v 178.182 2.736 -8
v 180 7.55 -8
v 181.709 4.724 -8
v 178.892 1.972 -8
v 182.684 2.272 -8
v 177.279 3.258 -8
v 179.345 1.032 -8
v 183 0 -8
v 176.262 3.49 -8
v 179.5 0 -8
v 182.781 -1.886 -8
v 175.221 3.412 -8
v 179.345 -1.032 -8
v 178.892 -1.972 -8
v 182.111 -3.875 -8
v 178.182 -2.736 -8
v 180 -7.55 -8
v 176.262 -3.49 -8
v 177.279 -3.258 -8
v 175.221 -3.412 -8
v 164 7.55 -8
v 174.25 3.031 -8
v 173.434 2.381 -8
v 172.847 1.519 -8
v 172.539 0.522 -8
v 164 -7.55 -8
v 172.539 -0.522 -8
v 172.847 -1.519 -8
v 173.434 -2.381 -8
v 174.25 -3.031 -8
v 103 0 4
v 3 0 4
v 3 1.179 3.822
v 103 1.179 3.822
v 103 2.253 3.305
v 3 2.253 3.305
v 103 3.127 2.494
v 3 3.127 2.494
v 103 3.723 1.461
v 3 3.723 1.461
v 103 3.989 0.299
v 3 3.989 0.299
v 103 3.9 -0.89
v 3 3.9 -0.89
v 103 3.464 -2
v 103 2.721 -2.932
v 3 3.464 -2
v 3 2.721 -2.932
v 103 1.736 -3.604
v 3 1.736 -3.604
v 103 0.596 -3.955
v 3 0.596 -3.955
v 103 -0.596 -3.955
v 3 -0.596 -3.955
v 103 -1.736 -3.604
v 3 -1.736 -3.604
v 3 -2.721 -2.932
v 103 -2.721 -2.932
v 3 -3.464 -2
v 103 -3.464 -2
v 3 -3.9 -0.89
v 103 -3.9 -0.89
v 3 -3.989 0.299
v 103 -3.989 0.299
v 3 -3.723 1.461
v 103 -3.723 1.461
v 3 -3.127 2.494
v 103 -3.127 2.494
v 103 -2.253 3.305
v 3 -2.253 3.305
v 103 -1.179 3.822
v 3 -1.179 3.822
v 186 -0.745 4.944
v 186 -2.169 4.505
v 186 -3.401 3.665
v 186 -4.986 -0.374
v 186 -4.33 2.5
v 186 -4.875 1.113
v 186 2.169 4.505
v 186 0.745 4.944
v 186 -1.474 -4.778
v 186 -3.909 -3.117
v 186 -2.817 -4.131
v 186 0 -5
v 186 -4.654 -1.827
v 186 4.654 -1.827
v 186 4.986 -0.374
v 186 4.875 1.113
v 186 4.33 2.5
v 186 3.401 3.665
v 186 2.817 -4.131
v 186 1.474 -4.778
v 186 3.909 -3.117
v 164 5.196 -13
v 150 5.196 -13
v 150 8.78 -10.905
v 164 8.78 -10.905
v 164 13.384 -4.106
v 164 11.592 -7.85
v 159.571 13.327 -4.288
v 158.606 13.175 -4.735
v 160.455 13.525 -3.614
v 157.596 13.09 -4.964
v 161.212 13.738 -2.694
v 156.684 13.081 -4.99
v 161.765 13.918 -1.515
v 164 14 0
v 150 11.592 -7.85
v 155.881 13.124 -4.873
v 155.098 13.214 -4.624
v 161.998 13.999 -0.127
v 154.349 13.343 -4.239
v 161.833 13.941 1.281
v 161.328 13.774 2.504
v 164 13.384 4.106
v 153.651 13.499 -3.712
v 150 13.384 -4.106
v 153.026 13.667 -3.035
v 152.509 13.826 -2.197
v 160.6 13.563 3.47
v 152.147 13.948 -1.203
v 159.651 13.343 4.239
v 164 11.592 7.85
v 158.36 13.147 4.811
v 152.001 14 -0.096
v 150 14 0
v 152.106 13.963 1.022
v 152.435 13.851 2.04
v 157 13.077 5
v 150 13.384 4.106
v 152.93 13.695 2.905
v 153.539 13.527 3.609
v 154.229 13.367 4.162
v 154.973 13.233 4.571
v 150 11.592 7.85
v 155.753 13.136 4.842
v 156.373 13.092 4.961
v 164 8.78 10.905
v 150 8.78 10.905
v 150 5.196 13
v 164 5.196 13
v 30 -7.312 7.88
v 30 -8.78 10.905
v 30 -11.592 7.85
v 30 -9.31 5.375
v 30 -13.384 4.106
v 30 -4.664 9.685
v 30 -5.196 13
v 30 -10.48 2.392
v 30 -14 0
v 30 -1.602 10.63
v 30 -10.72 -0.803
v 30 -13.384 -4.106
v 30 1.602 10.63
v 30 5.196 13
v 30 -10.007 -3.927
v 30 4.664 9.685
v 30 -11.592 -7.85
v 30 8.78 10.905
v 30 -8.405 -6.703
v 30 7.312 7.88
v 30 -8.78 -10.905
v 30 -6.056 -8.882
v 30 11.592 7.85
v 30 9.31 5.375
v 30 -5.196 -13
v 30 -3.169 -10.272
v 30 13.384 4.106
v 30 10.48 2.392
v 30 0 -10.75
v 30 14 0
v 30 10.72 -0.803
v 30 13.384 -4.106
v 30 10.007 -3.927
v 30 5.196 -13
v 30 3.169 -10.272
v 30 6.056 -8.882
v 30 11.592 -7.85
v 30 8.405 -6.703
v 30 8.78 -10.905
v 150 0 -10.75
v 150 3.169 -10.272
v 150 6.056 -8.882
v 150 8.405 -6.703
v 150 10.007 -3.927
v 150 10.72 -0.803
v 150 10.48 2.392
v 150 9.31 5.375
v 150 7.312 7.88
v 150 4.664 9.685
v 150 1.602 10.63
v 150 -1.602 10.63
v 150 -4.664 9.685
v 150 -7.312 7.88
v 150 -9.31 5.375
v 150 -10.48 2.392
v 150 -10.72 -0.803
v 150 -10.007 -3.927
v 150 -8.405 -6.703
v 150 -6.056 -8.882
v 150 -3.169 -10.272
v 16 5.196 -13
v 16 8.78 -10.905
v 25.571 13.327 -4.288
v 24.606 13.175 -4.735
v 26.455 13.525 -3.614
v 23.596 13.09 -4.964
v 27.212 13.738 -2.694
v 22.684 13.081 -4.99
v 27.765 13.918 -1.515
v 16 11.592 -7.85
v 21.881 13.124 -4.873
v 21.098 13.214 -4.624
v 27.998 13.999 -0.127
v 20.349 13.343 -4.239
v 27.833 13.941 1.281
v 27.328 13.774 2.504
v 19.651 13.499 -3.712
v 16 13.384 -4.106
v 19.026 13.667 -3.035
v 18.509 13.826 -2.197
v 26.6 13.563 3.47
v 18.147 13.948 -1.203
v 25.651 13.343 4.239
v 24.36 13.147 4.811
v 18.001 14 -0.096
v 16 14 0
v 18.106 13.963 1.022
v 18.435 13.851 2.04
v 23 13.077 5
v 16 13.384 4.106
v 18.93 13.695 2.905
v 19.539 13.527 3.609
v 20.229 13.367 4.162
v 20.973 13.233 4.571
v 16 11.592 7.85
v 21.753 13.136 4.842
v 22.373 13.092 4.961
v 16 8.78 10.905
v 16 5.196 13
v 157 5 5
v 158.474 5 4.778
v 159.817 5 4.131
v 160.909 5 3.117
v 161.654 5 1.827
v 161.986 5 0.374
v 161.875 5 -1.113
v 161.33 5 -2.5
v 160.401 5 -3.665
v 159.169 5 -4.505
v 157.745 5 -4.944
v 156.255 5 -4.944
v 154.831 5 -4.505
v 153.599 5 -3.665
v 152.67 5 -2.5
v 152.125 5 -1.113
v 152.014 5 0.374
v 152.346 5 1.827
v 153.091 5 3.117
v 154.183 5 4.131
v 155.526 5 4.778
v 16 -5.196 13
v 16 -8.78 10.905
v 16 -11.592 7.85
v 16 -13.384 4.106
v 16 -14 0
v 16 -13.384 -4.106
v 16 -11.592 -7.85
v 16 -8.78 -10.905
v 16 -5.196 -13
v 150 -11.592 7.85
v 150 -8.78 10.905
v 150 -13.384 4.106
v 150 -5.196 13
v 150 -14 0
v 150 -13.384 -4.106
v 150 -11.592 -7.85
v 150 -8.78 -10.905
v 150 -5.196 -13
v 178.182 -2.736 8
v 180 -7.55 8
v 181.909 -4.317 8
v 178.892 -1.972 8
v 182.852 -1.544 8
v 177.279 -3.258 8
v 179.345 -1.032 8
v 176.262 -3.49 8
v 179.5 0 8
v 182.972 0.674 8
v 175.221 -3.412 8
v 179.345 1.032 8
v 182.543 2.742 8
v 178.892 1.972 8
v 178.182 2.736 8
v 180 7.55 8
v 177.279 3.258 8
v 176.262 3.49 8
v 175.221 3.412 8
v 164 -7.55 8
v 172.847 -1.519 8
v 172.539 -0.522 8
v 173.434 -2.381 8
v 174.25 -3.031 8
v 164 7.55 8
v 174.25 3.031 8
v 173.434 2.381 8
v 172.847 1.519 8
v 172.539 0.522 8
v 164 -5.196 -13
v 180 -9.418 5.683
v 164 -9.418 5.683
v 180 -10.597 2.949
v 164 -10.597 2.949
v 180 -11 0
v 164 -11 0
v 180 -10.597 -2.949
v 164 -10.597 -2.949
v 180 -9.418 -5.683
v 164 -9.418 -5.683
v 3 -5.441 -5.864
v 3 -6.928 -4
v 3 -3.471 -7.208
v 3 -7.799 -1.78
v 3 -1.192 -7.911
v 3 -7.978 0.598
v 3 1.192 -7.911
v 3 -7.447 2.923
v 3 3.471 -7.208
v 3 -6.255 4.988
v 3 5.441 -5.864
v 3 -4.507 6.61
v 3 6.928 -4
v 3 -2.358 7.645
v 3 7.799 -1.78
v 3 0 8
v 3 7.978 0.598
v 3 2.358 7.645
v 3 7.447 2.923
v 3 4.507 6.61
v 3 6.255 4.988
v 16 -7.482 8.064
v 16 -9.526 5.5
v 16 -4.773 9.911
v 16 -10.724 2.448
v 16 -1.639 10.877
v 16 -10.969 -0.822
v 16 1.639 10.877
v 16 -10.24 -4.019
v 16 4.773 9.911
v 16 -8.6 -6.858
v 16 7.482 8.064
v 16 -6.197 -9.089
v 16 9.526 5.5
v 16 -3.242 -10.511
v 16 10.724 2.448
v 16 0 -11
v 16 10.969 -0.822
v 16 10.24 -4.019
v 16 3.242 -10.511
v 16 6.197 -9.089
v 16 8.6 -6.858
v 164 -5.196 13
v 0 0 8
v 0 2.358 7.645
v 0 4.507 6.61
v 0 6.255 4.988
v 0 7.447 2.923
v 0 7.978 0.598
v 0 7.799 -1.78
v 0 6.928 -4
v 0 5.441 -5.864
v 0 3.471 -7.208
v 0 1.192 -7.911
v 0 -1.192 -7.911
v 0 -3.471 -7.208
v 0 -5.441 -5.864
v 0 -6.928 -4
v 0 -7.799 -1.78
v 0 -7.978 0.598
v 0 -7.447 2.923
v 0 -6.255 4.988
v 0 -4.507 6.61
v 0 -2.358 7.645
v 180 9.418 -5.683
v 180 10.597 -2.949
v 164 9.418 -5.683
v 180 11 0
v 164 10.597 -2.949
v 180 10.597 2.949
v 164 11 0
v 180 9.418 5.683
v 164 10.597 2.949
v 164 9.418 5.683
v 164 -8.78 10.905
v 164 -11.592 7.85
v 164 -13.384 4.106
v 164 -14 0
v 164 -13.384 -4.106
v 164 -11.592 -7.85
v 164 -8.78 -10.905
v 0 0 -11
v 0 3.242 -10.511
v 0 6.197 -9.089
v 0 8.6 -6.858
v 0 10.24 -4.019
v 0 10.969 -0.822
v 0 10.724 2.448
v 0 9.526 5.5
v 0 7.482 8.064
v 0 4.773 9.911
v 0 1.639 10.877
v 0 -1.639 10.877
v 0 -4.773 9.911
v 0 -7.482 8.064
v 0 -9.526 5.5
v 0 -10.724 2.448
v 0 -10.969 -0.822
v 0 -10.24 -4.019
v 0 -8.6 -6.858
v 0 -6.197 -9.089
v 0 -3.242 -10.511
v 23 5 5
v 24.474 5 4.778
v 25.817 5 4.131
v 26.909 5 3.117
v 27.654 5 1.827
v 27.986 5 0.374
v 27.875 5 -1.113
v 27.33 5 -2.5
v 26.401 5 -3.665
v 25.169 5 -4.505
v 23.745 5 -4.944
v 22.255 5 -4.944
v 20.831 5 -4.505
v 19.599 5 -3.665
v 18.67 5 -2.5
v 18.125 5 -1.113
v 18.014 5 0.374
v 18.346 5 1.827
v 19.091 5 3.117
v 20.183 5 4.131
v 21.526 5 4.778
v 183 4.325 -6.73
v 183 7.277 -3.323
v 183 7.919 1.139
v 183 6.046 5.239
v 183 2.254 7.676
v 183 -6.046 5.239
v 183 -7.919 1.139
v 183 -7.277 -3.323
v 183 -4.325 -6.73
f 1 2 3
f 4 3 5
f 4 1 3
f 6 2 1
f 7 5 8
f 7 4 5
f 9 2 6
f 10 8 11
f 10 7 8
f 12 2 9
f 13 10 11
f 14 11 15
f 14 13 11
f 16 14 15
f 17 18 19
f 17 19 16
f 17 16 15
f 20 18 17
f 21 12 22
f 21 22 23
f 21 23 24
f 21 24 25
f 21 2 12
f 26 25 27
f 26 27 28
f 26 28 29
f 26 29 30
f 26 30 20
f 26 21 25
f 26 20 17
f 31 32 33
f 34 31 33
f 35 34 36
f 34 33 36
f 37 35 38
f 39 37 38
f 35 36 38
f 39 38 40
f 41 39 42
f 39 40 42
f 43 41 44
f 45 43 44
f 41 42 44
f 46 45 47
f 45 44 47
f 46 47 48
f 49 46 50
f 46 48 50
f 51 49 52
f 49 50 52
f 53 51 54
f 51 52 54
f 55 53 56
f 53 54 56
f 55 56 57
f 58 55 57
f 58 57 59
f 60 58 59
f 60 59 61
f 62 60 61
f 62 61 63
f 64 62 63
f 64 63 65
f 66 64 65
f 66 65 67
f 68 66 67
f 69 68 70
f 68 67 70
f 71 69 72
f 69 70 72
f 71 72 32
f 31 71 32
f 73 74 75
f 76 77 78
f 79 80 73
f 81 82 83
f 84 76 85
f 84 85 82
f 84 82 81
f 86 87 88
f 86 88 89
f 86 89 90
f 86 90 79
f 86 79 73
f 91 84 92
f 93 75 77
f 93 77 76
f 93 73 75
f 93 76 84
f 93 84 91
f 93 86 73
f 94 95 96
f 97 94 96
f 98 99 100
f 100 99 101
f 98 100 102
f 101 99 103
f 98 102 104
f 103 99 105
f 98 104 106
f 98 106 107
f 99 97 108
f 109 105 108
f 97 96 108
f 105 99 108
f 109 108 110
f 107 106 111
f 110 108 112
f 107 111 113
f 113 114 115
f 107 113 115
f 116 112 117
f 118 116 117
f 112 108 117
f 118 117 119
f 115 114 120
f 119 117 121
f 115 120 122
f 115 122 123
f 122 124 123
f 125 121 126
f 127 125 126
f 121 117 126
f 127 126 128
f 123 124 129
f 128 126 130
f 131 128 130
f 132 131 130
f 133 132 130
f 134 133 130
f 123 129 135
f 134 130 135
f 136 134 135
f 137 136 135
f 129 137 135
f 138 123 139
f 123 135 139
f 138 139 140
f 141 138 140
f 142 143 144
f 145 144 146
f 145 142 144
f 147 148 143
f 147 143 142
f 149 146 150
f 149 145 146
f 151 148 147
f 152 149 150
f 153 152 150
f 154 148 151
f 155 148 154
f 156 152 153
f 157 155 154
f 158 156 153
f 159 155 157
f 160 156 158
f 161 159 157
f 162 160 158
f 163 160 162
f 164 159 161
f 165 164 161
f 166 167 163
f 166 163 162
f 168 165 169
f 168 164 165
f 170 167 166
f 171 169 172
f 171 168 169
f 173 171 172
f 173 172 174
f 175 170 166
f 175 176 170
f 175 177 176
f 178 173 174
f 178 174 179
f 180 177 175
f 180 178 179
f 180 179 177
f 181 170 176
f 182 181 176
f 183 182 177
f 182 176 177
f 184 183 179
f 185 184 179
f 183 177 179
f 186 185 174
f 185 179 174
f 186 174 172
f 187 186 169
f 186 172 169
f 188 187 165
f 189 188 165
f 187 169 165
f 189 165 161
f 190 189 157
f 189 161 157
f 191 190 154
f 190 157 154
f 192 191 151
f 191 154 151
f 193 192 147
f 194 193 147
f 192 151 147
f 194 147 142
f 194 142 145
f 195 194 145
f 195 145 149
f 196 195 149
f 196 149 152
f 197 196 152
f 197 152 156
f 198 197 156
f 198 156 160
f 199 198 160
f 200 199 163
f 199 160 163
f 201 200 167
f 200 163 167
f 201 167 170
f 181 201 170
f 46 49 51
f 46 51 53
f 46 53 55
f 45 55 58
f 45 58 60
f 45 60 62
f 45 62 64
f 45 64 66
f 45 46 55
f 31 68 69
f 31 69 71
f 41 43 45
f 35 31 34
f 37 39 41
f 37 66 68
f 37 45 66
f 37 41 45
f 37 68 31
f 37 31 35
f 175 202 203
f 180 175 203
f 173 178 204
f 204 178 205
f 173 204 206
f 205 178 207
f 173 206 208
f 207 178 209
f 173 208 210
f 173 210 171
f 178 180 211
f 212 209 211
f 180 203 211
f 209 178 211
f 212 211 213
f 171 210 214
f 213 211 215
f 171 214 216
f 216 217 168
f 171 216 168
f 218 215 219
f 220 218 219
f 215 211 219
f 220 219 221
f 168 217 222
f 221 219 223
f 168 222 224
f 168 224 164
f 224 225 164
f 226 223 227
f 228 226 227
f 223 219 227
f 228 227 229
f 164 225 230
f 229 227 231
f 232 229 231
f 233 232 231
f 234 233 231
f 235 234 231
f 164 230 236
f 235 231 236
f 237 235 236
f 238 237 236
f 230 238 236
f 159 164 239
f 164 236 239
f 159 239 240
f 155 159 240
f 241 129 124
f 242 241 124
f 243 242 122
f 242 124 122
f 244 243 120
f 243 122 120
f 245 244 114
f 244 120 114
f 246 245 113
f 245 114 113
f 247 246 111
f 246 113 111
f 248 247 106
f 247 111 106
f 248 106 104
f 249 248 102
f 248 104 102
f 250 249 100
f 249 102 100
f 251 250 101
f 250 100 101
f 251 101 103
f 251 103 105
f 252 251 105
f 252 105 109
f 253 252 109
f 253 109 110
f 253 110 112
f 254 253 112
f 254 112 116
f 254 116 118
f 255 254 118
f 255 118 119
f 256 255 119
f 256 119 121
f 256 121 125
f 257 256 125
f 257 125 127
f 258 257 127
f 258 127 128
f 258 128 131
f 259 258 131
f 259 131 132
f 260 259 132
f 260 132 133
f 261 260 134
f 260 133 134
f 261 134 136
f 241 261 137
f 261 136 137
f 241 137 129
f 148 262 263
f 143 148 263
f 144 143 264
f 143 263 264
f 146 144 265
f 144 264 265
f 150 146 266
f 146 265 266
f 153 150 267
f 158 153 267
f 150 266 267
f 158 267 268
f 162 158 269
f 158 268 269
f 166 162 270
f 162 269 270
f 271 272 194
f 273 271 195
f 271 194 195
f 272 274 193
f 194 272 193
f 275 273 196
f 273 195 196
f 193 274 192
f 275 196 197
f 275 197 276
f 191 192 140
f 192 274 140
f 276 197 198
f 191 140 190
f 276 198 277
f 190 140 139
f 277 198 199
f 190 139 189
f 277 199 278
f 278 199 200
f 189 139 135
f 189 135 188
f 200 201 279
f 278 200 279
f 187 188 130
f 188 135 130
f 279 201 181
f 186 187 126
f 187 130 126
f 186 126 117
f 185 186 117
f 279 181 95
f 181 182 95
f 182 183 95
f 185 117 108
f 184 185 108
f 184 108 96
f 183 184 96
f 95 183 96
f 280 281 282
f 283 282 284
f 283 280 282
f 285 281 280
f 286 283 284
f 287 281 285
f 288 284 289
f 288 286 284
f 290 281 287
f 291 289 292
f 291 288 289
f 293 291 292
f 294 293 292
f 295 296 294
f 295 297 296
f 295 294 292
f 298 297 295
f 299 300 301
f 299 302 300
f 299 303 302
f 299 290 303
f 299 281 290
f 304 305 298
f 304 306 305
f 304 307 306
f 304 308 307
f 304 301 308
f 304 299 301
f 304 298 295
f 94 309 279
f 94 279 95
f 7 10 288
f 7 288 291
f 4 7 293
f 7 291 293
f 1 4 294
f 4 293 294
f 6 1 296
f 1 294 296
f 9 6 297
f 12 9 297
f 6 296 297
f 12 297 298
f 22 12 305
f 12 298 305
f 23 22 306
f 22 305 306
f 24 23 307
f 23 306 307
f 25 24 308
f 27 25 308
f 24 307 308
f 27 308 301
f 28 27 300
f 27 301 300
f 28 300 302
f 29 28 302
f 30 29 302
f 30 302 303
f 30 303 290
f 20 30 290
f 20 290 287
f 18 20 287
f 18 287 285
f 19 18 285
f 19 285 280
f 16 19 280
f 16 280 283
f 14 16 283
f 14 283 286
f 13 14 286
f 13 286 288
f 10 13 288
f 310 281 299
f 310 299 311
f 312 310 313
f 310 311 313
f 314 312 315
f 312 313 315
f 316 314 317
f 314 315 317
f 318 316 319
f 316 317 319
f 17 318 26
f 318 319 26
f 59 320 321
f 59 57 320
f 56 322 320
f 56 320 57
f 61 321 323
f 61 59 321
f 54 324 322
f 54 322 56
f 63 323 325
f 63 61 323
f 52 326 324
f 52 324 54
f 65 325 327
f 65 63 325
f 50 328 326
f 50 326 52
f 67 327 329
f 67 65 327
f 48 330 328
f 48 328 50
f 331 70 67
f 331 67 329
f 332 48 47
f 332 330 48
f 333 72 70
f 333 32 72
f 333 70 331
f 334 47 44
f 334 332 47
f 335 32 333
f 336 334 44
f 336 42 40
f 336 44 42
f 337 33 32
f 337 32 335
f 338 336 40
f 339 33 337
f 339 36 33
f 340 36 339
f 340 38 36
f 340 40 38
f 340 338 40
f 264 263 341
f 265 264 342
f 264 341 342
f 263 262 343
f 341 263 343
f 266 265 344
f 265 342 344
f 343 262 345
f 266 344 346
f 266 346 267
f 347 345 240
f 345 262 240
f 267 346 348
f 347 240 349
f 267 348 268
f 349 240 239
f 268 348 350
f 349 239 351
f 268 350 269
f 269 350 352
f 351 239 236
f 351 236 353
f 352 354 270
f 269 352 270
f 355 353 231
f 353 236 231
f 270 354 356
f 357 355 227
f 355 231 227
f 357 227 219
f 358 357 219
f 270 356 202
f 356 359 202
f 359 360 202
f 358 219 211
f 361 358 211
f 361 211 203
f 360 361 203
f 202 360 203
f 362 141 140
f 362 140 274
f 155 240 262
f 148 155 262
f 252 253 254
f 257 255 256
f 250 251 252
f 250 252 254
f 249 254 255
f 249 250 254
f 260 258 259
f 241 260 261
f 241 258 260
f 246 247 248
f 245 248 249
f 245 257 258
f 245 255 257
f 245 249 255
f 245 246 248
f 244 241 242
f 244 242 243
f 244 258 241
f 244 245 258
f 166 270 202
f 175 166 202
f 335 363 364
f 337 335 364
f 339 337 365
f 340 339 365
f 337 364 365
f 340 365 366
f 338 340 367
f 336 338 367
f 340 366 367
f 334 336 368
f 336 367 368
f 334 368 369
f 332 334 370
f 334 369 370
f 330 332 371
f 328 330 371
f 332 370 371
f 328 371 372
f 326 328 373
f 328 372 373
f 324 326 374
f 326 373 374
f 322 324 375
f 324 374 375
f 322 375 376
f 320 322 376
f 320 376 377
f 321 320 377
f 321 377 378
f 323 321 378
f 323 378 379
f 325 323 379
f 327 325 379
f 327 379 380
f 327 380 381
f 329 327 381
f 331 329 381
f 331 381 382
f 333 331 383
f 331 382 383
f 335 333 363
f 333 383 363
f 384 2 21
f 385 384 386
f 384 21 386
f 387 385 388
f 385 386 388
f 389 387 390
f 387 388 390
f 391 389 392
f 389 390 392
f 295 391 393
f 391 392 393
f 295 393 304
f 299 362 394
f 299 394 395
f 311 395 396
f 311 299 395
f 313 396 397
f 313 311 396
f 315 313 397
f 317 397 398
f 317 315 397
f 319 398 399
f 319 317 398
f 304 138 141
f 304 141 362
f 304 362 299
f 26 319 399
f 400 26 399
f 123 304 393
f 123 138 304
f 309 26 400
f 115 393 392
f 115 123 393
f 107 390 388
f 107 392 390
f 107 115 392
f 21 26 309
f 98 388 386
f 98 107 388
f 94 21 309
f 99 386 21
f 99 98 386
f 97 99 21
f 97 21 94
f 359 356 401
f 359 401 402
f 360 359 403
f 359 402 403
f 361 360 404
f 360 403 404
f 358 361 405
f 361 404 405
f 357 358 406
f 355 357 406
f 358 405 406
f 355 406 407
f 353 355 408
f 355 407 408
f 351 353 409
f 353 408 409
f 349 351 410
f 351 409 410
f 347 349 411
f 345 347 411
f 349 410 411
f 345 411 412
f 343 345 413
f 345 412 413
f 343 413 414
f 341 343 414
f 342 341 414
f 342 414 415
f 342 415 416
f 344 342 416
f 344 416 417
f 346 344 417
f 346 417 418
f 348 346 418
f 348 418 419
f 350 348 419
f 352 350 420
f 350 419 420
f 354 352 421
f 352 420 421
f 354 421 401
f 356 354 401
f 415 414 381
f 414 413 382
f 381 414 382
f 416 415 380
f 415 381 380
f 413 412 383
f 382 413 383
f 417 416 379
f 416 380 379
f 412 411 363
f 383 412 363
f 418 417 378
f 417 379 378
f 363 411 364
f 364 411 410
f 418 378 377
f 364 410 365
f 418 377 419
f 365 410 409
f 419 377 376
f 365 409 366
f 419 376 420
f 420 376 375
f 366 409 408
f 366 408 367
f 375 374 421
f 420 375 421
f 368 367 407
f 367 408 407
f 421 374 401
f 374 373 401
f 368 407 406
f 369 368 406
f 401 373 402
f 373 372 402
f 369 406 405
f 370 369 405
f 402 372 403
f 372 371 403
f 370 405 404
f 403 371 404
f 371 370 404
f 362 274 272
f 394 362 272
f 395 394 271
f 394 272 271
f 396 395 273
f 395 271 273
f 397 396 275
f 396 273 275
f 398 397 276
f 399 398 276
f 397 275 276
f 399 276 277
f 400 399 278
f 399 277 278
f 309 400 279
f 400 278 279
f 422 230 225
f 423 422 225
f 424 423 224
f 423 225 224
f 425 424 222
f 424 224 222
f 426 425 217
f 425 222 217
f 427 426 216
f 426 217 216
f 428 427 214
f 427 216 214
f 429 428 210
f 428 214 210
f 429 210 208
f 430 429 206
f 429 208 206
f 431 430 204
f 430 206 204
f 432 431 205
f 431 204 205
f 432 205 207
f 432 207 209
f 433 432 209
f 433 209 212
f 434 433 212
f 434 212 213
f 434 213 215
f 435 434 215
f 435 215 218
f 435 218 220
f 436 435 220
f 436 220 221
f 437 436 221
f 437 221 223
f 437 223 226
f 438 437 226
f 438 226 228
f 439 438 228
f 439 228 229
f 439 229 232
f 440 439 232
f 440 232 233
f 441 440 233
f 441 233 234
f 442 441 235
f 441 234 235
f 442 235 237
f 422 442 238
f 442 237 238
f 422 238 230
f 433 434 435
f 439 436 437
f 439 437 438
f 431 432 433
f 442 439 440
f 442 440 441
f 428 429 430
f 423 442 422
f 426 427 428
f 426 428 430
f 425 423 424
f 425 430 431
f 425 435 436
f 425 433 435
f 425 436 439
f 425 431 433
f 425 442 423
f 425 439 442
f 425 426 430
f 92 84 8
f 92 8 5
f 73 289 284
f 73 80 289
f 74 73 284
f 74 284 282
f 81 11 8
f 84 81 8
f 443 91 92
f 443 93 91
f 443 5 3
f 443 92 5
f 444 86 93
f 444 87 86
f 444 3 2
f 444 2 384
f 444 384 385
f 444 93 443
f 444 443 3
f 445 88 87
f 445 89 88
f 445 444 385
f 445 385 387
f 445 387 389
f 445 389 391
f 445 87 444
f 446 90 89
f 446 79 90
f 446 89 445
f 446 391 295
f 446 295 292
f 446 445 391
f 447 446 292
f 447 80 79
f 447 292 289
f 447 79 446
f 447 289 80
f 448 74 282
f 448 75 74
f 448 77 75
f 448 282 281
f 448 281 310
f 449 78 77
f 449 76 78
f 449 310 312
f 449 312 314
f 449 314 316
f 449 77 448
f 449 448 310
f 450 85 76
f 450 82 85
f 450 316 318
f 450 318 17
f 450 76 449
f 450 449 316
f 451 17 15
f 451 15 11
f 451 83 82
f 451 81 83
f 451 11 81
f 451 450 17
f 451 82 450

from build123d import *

# Parameters (mm, degrees)
SKETCH_2_R          = 11
EXTRUDE_1_DEPTH     = 16
EXTRUDE_2_DEPTH     = 14
SKETCH_5_R          = 10.75
EXTRUDE_3_DEPTH     = 120
EXTRUDE_4_DEPTH     = 14
SKETCH_7_R          = 8
CUT_EXTRUDE_1_DEPTH = 3
SKETCH_8_R          = 4
CUT_EXTRUDE_2_DEPTH = 100
SKETCH_9_R          = 5
CUT_EXTRUDE_3_DEPTH = 15
SKETCH_10_R         = 11
EXTRUDE_5_DEPTH     = 22
CHAMFER_1_SIZE      = 6
CUT_EXTRUDE_START   = -22
CUT_EXTRUDE_4_DEPTH = 22
SKETCH_12_R         = 3.5
CUT_EXTRUDE_5_DEPTH = 188.704555105


with BuildPart() as part:
    # ｽｹｯﾁ2 → ﾎﾞｽ - 押し出し1 (new body)
    with BuildSketch(Plane(origin=(0, 0, 0), x_dir=(0, 0, -1), z_dir=(1, 0, 0))):
        Circle(SKETCH_2_R)
    extrude(amount=EXTRUDE_1_DEPTH)

    # ｽｹｯﾁ4 → ﾎﾞｽ - 押し出し2 (add)
    with BuildSketch(Plane(origin=(16, 0, 0), x_dir=(0, 0, -1), z_dir=(1, 0, 0))):
        with BuildLine():
            Line((13, -5.196152423), (13, 5.196152423))
            Line((13, 5.196152423), (9.695359715, 5.196152423))
            ThreePointArc((9.695359715, 5.196152423), (10.668855535, 2.678716403), (11, 0))
            ThreePointArc((11, 0), (10.668855535, -2.678716403), (9.695359715, -5.196152423))
            Line((9.695359715, -5.196152423), (13, -5.196152423))
        make_face()
        with BuildLine():
            Line((9.695359715, 5.196152423), (-9.695359715, 5.196152423))
            ThreePointArc((-9.695359715, 5.196152423), (-11, 0), (-9.695359715, -5.196152423))
            Line((-9.695359715, -5.196152423), (9.695359715, -5.196152423))
            ThreePointArc((9.695359715, -5.196152423), (10.668855535, -2.678716403), (11, 0))
            ThreePointArc((11, 0), (10.668855535, 2.678716403), (9.695359715, 5.196152423))
        make_face()
        with BuildLine():
            Line((-9.695359715, 5.196152423), (-13, 5.196152423))
            Line((-13, 5.196152423), (-13, -5.196152423))
            Line((-13, -5.196152423), (-9.695359715, -5.196152423))
            ThreePointArc((-9.695359715, -5.196152423), (-11, 0), (-9.695359715, 5.196152423))
        make_face()
        with BuildLine():
            ThreePointArc((13, 5.196152423), (0, 14), (-13, 5.196152423))
            Line((-13, 5.196152423), (-9.695359715, 5.196152423))
            ThreePointArc((-9.695359715, 5.196152423), (0, 11), (9.695359715, 5.196152423))
            Line((9.695359715, 5.196152423), (13, 5.196152423))
        make_face()
        with BuildLine():
            ThreePointArc((9.695359715, 5.196152423), (0, 11), (-9.695359715, 5.196152423))
            Line((-9.695359715, 5.196152423), (9.695359715, 5.196152423))
        make_face()
        with BuildLine():
            Line((9.695359715, -5.196152423), (-9.695359715, -5.196152423))
            ThreePointArc((-9.695359715, -5.196152423), (0, -11), (9.695359715, -5.196152423))
        make_face()
        with BuildLine():
            Line((-9.695359715, -5.196152423), (-13, -5.196152423))
            ThreePointArc((-13, -5.196152423), (0, -14), (13, -5.196152423))
            Line((13, -5.196152423), (9.695359715, -5.196152423))
            ThreePointArc((9.695359715, -5.196152423), (0, -11), (-9.695359715, -5.196152423))
        make_face()
    extrude(amount=EXTRUDE_2_DEPTH)

    # ｽｹｯﾁ5 → ﾎﾞｽ - 押し出し3 (add)
    with BuildSketch(Plane(origin=(30, 0, 0), x_dir=(0, 0, -1), z_dir=(1, 0, 0))):
        Circle(SKETCH_5_R)
    extrude(amount=EXTRUDE_3_DEPTH)

    # ｽｹｯﾁ6 → ﾎﾞｽ - 押し出し4 (add)
    with BuildSketch(Plane(origin=(150, 0, 0), x_dir=(0, 0, -1), z_dir=(1, 0, 0))):
        with BuildLine():
            ThreePointArc((9.410765112, 5.196152423), (0, 10.75), (-9.410765112, 5.196152423))
            Line((-9.410765112, 5.196152423), (9.410765112, 5.196152423))
        make_face()
        with BuildLine():
            ThreePointArc((13, 5.196152423), (0, 14), (-13, 5.196152423))
            Line((-13, 5.196152423), (-9.410765112, 5.196152423))
            ThreePointArc((-9.410765112, 5.196152423), (0, 10.75), (9.410765112, 5.196152423))
            Line((9.410765112, 5.196152423), (13, 5.196152423))
        make_face()
        with BuildLine():
            ThreePointArc((-9.410765112, 5.196152423), (-10.75, 0), (-9.410765112, -5.196152423))
            Line((-9.410765112, -5.196152423), (9.410765112, -5.196152423))
            ThreePointArc((9.410765112, -5.196152423), (10.409808475, -2.682981088), (10.75, 0))
            ThreePointArc((10.75, 0), (10.409808475, 2.682981088), (9.410765112, 5.196152423))
            Line((9.410765112, 5.196152423), (-9.410765112, 5.196152423))
        make_face()
        with BuildLine():
            Line((9.410765112, -5.196152423), (13, -5.196152423))
            Line((13, -5.196152423), (13, 5.196152423))
            Line((13, 5.196152423), (9.410765112, 5.196152423))
            ThreePointArc((9.410765112, 5.196152423), (10.409808475, 2.682981088), (10.75, 0))
            ThreePointArc((10.75, 0), (10.409808475, -2.682981088), (9.410765112, -5.196152423))
        make_face()
        with BuildLine():
            Line((-13, 5.196152423), (-13, -5.196152423))
            Line((-13, -5.196152423), (-9.410765112, -5.196152423))
            ThreePointArc((-9.410765112, -5.196152423), (-10.75, 0), (-9.410765112, 5.196152423))
            Line((-9.410765112, 5.196152423), (-13, 5.196152423))
        make_face()
        with BuildLine():
            Line((9.410765112, -5.196152423), (-9.410765112, -5.196152423))
            ThreePointArc((-9.410765112, -5.196152423), (0, -10.75), (9.410765112, -5.196152423))
        make_face()
        with BuildLine():
            Line((-9.410765112, -5.196152423), (-13, -5.196152423))
            ThreePointArc((-13, -5.196152423), (0, -14), (13, -5.196152423))
            Line((13, -5.196152423), (9.410765112, -5.196152423))
            ThreePointArc((9.410765112, -5.196152423), (0, -10.75), (-9.410765112, -5.196152423))
        make_face()
    extrude(amount=EXTRUDE_4_DEPTH)

    # ｽｹｯﾁ7 → ｶｯﾄ - 押し出し1 (cut)
    with BuildSketch(Plane.ZY):
        Circle(SKETCH_7_R)
    extrude(amount=-CUT_EXTRUDE_1_DEPTH, mode=Mode.SUBTRACT)

    # ｽｹｯﾁ8 → ｶｯﾄ - 押し出し2 (cut)
    with BuildSketch(Plane.ZY.offset(-3)):
        Circle(SKETCH_8_R)
    extrude(amount=-CUT_EXTRUDE_2_DEPTH, mode=Mode.SUBTRACT)

    # ｽｹｯﾁ9 → ｶｯﾄ - 押し出し3 (cut)
    with BuildSketch(Plane(origin=(0, 20, 0), x_dir=(1, 0, 0), z_dir=(0, 1, 0))):
        with Locations(Location((23, 0, 0), (0, 0, 270))):
            Circle(SKETCH_9_R)
        with Locations(Location((157, 0, 0), (0, 0, 270))):
            Circle(SKETCH_9_R)
    extrude(amount=-CUT_EXTRUDE_3_DEPTH, mode=Mode.SUBTRACT)

    # ｽｹｯﾁ10 → ﾎﾞｽ - 押し出し5 (add)
    with BuildSketch(Plane(origin=(164, 0, 0), x_dir=(0, 0, -1), z_dir=(1, 0, 0))):
        Circle(SKETCH_10_R)
    extrude(amount=EXTRUDE_5_DEPTH)

    # 面取り1
    chamfer_1_edges = [part.edges().sort_by_distance(p)[0] for p in [
        (186, 0, 11),
    ]]
    chamfer(chamfer_1_edges, length=CHAMFER_1_SIZE)

    # ｽｹｯﾁ11 → ｶｯﾄ - 押し出し4 (cut)
    with BuildSketch(Plane(origin=(186, 0, 0), x_dir=(0, 0, -1), z_dir=(1, 0, 0)).offset(CUT_EXTRUDE_START)):
        with BuildLine():
            ThreePointArc((-8, 7.549834435), (-11, 0), (-8, -7.549834435))
            Line((-8, -7.549834435), (-8, 7.549834435))
        make_face()
        with BuildLine():
            Line((8, 7.549834435), (8, -7.549834435))
            ThreePointArc((8, -7.549834435), (10.22252415, -4.062019202), (11, 0))
            ThreePointArc((11, 0), (10.22252415, 4.062019202), (8, 7.549834435))
        make_face()
    extrude(amount=CUT_EXTRUDE_4_DEPTH, mode=Mode.SUBTRACT)

    # ｽｹｯﾁ12 → ｶｯﾄ - 押し出し5 (cut, through all)
    with BuildSketch(Plane.XY.offset(8)):
        with Locations((176, 0)):
            Circle(SKETCH_12_R)
    extrude(amount=-CUT_EXTRUDE_5_DEPTH, mode=Mode.SUBTRACT)


solid = part.part
